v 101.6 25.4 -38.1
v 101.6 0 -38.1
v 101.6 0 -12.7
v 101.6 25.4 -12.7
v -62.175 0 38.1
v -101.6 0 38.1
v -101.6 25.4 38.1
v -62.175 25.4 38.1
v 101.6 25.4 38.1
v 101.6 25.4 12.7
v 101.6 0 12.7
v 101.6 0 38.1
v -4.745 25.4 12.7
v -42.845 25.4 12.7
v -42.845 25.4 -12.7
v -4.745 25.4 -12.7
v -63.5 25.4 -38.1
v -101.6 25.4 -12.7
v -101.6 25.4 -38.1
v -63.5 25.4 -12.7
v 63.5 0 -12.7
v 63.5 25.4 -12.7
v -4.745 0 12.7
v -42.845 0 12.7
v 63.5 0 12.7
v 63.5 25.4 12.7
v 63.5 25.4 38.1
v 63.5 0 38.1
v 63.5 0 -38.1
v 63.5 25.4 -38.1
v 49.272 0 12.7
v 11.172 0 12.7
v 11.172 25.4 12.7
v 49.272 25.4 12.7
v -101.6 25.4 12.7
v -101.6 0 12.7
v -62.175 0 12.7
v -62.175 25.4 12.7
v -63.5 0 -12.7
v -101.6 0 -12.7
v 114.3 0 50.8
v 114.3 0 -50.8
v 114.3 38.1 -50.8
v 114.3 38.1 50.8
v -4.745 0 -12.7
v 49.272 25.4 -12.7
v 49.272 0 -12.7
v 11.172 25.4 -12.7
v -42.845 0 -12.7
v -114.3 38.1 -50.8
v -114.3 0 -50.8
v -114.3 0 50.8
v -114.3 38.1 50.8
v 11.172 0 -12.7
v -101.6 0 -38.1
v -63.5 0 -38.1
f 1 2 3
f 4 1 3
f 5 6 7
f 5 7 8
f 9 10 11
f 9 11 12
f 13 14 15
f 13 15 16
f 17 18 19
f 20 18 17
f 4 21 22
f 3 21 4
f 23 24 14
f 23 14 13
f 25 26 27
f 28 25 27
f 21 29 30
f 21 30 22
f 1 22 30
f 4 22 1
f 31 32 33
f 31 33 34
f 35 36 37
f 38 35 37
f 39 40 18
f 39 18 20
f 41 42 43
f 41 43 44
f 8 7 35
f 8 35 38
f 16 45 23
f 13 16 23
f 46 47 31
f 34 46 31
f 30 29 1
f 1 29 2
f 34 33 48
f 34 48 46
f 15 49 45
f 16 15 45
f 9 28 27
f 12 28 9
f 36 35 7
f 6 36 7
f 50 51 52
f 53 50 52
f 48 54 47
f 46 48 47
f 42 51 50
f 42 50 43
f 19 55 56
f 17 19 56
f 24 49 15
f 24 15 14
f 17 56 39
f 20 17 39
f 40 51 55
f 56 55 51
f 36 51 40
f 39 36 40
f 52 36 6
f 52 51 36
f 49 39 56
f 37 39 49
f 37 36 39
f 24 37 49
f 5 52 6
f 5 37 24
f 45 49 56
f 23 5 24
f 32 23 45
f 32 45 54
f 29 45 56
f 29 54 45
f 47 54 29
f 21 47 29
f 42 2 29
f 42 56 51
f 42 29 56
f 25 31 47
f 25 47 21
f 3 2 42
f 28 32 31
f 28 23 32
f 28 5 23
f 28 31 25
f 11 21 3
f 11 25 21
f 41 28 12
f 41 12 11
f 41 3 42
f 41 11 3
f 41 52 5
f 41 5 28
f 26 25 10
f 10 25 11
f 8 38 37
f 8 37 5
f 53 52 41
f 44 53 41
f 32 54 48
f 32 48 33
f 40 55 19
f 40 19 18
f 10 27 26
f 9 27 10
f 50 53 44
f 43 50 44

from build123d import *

# Parameters (mm, degrees)
F0_W     = 228.6
F0_H     = 101.6
F0_W_2   = 39.424618
F0_H_2   = 25.4
F0_W_3   = 38.1
F1_DEPTH = 38.1
F2_DEPTH = 25.4


with BuildPart() as f1:
    # F0 (on Front) → F1 (new body)
    with BuildSketch(Plane.XZ):
        Rectangle(F0_W, F0_H)
        Polygon((-63.5, -38.1), (-101.6, -38.1), (-101.6, -12.7), (-101.6, 12.7), (-101.6, 38.1), (-62.175382, 38.1), (63.5, 38.1), (101.6, 38.1), (101.6, 12.7), (101.6, -12.7), (101.6, -38.1), (63.5, -38.1), align=None, mode=Mode.SUBTRACT)
        with Locations((-81.887691, 25.4)):
            Rectangle(F0_W_2, F0_H_2)
        Polygon((-63.5, -12.7), (-63.5, -38.1), (63.5, -38.1), (63.5, -12.7), (101.6, -12.7), (101.6, 12.7), (63.5, 12.7), (63.5, 38.1), (-62.175382, 38.1), (-62.175382, 12.7), (-101.6, 12.7), (-101.6, -12.7), align=None)
        with Locations((-23.794951, 0)):
            Rectangle(F0_W_3, F0_H_2, mode=Mode.SUBTRACT)
        with Locations((30.221954, 0)):
            Rectangle(F0_W_3, F0_H_2, mode=Mode.SUBTRACT)
        with Locations((-23.794951, 0)):
            Rectangle(F0_W_3, F0_H_2)
        with Locations((-82.55, -25.4)):
            Rectangle(F0_W_3, F0_H_2)
        with Locations((30.221954, 0)):
            Rectangle(F0_W_3, F0_H_2)
        with Locations((82.55, -25.4)):
            Rectangle(F0_W_3, F0_H_2)
        with Locations((82.55, 25.4)):
            Rectangle(F0_W_3, F0_H_2)
    extrude(amount=-F1_DEPTH)

    # F0 (on Front) → F2 (cut)
    with BuildSketch(Plane.XZ):
        with Locations((-81.887691, 25.4)):
            Rectangle(F0_W_2, F0_H_2)
        with Locations((-82.55, -25.4)):
            Rectangle(F0_W_3, F0_H_2)
        with Locations((-23.794951, 0)):
            Rectangle(F0_W_3, F0_H_2)
        with Locations((30.221954, 0)):
            Rectangle(F0_W_3, F0_H_2)
        with Locations((82.55, 25.4)):
            Rectangle(F0_W_3, F0_H_2)
        with Locations((82.55, -25.4)):
            Rectangle(F0_W_3, F0_H_2)
    extrude(amount=-F2_DEPTH, mode=Mode.SUBTRACT)


solid = f1.part
